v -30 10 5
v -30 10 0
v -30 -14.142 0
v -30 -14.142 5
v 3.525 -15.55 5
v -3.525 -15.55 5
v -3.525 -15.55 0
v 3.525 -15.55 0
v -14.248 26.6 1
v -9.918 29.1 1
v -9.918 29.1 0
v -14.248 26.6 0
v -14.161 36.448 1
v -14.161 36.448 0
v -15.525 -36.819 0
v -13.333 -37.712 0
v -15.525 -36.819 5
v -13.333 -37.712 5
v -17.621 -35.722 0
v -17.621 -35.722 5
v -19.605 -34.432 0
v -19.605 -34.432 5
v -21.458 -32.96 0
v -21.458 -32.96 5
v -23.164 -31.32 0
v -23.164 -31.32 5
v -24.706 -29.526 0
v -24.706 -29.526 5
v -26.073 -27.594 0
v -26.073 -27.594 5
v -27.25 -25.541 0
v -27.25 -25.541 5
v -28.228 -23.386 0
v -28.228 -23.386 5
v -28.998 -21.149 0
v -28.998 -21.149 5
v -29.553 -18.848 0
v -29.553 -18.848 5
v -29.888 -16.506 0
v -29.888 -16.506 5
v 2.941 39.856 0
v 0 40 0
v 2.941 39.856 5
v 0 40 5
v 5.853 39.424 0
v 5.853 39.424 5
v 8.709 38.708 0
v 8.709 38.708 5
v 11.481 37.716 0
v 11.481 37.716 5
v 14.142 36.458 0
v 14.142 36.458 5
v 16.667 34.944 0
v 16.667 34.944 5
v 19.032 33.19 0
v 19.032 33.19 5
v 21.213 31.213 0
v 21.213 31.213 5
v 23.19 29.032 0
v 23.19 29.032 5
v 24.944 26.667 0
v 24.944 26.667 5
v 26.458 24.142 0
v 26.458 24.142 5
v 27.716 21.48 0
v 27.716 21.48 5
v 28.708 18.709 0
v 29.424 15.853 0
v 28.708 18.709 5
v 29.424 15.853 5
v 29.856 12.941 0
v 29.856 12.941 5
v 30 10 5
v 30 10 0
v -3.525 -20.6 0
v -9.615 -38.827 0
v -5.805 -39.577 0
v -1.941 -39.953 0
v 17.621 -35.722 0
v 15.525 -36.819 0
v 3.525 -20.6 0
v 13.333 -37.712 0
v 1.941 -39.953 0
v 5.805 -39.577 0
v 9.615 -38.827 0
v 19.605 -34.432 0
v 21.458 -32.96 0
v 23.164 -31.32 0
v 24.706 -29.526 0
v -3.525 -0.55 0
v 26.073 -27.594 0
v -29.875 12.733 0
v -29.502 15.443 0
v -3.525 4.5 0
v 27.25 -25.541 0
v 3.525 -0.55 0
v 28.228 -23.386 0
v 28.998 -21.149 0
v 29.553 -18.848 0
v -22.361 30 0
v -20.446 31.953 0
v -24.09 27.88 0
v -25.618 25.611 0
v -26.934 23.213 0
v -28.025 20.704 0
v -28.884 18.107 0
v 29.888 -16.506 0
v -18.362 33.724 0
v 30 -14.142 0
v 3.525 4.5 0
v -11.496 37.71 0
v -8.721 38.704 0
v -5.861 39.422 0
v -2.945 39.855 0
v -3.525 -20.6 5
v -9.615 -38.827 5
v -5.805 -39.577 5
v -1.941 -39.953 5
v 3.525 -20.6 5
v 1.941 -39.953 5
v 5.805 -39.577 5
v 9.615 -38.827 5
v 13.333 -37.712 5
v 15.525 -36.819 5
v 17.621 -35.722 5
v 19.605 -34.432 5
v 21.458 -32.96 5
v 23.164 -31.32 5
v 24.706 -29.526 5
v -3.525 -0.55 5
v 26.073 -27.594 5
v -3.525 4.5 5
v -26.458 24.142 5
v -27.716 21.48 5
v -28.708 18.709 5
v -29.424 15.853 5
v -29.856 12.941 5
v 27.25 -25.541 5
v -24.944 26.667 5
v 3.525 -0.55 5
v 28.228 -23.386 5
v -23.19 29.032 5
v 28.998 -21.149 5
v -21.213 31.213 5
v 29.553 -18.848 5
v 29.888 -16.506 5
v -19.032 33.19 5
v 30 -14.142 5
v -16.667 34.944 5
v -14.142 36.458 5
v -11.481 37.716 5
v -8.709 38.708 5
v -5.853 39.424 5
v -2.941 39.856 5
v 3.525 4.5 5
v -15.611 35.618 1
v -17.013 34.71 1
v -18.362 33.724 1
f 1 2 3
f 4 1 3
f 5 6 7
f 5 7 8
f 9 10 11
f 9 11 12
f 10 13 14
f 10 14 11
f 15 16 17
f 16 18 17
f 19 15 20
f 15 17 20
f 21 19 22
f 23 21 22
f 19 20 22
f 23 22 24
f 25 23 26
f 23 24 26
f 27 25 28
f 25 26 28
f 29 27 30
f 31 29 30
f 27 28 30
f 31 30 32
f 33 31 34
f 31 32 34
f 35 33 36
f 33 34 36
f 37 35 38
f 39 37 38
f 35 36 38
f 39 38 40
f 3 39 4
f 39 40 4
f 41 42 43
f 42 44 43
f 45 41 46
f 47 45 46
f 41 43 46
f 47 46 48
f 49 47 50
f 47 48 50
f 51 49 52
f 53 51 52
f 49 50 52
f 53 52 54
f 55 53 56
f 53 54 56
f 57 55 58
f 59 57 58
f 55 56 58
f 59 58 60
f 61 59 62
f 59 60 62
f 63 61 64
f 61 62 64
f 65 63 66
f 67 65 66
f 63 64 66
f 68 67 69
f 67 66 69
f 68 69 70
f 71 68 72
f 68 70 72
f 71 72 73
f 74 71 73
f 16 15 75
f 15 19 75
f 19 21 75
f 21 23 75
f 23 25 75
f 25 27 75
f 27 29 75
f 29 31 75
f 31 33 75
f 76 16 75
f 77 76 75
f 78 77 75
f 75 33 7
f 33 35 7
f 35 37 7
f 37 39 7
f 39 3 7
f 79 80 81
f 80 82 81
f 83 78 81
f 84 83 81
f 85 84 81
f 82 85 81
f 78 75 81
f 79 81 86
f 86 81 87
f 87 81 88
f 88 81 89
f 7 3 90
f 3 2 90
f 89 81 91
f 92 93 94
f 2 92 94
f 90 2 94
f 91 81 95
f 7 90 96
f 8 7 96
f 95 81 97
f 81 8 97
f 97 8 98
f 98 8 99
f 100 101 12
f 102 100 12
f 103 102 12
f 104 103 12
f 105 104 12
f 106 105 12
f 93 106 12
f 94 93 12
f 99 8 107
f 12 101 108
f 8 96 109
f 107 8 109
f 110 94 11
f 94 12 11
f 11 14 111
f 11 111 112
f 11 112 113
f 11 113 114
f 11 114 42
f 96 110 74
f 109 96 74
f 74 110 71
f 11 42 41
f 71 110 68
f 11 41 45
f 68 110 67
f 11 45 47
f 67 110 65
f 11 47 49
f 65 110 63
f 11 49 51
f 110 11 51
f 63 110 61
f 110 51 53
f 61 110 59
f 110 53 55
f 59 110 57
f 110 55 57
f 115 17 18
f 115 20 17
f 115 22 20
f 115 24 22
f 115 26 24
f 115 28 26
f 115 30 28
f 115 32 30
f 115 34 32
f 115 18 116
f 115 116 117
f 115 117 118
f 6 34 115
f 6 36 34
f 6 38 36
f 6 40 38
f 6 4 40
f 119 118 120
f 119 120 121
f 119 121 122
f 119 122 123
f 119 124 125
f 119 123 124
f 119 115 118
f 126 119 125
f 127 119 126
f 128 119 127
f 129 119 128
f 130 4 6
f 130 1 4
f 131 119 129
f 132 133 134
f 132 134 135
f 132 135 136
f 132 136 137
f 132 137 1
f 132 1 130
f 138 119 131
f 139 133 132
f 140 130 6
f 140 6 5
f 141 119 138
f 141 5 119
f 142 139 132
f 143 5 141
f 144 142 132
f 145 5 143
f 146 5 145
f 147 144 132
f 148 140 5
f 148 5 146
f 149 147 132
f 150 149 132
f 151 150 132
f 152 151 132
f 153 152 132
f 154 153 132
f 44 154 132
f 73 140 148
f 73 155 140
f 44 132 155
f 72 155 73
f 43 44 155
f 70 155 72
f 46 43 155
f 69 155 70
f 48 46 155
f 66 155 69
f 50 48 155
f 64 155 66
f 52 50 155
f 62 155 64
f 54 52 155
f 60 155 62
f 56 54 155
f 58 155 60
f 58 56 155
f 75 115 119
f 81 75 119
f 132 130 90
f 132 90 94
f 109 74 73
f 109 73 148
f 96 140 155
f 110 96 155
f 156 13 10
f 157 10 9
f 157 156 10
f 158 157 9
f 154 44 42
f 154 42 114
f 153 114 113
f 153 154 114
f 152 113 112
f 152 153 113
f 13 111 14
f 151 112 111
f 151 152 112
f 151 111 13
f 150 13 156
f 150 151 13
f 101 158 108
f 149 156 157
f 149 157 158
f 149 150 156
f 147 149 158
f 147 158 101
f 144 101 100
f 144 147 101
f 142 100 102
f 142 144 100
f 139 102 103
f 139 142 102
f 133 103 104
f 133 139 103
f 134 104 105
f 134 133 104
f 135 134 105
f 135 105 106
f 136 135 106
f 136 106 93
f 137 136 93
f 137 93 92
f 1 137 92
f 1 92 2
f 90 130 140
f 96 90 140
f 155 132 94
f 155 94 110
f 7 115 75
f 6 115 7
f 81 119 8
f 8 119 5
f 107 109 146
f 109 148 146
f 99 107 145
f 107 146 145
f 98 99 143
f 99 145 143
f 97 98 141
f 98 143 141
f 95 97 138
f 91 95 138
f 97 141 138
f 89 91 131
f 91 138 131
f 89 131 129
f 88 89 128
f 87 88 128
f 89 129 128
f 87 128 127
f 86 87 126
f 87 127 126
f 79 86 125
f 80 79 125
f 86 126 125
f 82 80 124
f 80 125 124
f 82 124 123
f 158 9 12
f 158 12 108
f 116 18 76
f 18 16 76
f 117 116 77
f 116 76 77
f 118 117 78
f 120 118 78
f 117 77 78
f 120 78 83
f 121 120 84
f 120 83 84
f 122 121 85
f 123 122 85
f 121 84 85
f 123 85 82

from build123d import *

# Parameters (mm, degrees)
SKETCH1_R           = 40
BOSS_EXTRUDE1_DEPTH = 5
CUT_EXTRUDE3_START  = -10
CUT_EXTRUDE3_DEPTH  = 10
FILLET1_R           = 30
FILLET2_R           = 25
SKETCH14_W          = 7.05
SKETCH14_H          = 5.05
CUT_EXTRUDE4_DEPTH  = 10
CUT_EXTRUDE5_START  = -1
CUT_EXTRUDE5_DEPTH  = 1


# Read off the part's stored shape, not the designer's step: Cut-Extrude5
with BuildPart() as part:
    # Sketch1 → Boss-Extrude1 (new body)
    with BuildSketch(Plane.XY):
        Circle(SKETCH1_R)
    extrude(amount=BOSS_EXTRUDE1_DEPTH)

    # Sketch10 → Cut-Extrude3 (cut)
    with BuildSketch(Plane.XY.offset(5).offset(CUT_EXTRUDE3_START)):
        with BuildLine():
            Line((-30, 26.457513111), (-30, -26.457513111))
            ThreePointArc((-30, -26.457513111), (-40, 0), (-30, 26.457513111))
        make_face()
        with BuildLine():
            Line((30, 26.457513111), (30, -26.457513111))
            ThreePointArc((30, -26.457513111), (40, 0), (30, 26.457513111))
        make_face()
    extrude(amount=CUT_EXTRUDE3_DEPTH, mode=Mode.SUBTRACT)

    # Fillet1
    fillet1_edges = [part.edges().sort_by_distance(p)[0] for p in [
        (-30, 26.457513111, 2.5),
        (30, 26.457513111, 2.5),
    ]]
    fillet(fillet1_edges, radius=FILLET1_R - 0.0001)  # a hair under: the kernel refuses the full size

    # Fillet2
    fillet2_edges = [part.edges().sort_by_distance(p)[0] for p in [
        (-30, -26.457513111, 2.5),
        (30, -26.457513111, 2.5),
    ]]
    fillet(fillet2_edges, radius=FILLET2_R)

    # Sketch14 → Cut-Extrude4 (cut)
    with BuildSketch(Plane.XY.offset(5)):
        with Locations((0, 1.975)):
            Rectangle(SKETCH14_W, SKETCH14_H)
        with Locations((0, -18.075)):
            Rectangle(SKETCH14_W, SKETCH14_H)
    extrude(amount=-CUT_EXTRUDE4_DEPTH, mode=Mode.SUBTRACT)

    # Cut-Extrude5 outline → Cut-Extrude5 (cut)
    with BuildSketch(Plane(origin=(0, 0, 0), x_dir=(-1, 0, 0), z_dir=(0, 0, -1)).offset(CUT_EXTRUDE5_START)):
        Polygon((15.056868042, 38), (14.160607491, 36.447631189), (9.918295379, 29.099731068), (14.248422398, 26.599731068), (18.36181188, 33.724330643), (20, 36.5617557), (20, 38), align=None)
    extrude(amount=CUT_EXTRUDE5_DEPTH, mode=Mode.SUBTRACT)


solid = part.part
